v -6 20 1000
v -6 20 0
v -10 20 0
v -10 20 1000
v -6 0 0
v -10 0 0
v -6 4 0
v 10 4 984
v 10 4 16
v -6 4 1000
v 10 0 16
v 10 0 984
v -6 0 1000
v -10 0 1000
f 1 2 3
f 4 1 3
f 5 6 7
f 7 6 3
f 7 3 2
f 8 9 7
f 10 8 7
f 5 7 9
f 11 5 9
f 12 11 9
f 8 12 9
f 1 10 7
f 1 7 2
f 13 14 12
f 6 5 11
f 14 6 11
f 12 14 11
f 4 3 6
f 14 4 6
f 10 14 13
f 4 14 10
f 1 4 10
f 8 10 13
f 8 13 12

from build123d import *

# Parameters (mm, degrees)
EXTRUDE_1_DEPTH     = 1000
CUT_EXTRUDE_1_DEPTH = 1001.177984161
CUT_EXTRUDE_2_DEPTH = 1001.177984161


with BuildPart() as part:
    # Эскиз1 → Бобышка-Вытянуть1 (new body)
    with BuildSketch(Plane.XY):
        Polygon((-10, 0), (10, 0), (10, 4), (-6, 4), (-6, 20), (-10, 20), align=None)
    extrude(amount=EXTRUDE_1_DEPTH)

    # Эскиз2 → Вырез-Вытянуть1 (cut, through all)
    with BuildSketch(Plane(origin=(0, 4, 0), x_dir=(1, 0, 0), z_dir=(0, 1, 0))):
        Polygon((-6, 0), (10, -16), (10, 0), align=None)
    extrude(amount=-CUT_EXTRUDE_1_DEPTH, mode=Mode.SUBTRACT)

    # Эскиз3 → Вырез-Вытянуть2 (cut, through all)
    with BuildSketch(Plane(origin=(0, 4, 0), x_dir=(1, 0, 0), z_dir=(0, 1, 0))):
        Polygon((-6, -1000), (10, -984), (10, -1000), align=None)
    extrude(amount=-CUT_EXTRUDE_2_DEPTH, mode=Mode.SUBTRACT)


solid = part.part
